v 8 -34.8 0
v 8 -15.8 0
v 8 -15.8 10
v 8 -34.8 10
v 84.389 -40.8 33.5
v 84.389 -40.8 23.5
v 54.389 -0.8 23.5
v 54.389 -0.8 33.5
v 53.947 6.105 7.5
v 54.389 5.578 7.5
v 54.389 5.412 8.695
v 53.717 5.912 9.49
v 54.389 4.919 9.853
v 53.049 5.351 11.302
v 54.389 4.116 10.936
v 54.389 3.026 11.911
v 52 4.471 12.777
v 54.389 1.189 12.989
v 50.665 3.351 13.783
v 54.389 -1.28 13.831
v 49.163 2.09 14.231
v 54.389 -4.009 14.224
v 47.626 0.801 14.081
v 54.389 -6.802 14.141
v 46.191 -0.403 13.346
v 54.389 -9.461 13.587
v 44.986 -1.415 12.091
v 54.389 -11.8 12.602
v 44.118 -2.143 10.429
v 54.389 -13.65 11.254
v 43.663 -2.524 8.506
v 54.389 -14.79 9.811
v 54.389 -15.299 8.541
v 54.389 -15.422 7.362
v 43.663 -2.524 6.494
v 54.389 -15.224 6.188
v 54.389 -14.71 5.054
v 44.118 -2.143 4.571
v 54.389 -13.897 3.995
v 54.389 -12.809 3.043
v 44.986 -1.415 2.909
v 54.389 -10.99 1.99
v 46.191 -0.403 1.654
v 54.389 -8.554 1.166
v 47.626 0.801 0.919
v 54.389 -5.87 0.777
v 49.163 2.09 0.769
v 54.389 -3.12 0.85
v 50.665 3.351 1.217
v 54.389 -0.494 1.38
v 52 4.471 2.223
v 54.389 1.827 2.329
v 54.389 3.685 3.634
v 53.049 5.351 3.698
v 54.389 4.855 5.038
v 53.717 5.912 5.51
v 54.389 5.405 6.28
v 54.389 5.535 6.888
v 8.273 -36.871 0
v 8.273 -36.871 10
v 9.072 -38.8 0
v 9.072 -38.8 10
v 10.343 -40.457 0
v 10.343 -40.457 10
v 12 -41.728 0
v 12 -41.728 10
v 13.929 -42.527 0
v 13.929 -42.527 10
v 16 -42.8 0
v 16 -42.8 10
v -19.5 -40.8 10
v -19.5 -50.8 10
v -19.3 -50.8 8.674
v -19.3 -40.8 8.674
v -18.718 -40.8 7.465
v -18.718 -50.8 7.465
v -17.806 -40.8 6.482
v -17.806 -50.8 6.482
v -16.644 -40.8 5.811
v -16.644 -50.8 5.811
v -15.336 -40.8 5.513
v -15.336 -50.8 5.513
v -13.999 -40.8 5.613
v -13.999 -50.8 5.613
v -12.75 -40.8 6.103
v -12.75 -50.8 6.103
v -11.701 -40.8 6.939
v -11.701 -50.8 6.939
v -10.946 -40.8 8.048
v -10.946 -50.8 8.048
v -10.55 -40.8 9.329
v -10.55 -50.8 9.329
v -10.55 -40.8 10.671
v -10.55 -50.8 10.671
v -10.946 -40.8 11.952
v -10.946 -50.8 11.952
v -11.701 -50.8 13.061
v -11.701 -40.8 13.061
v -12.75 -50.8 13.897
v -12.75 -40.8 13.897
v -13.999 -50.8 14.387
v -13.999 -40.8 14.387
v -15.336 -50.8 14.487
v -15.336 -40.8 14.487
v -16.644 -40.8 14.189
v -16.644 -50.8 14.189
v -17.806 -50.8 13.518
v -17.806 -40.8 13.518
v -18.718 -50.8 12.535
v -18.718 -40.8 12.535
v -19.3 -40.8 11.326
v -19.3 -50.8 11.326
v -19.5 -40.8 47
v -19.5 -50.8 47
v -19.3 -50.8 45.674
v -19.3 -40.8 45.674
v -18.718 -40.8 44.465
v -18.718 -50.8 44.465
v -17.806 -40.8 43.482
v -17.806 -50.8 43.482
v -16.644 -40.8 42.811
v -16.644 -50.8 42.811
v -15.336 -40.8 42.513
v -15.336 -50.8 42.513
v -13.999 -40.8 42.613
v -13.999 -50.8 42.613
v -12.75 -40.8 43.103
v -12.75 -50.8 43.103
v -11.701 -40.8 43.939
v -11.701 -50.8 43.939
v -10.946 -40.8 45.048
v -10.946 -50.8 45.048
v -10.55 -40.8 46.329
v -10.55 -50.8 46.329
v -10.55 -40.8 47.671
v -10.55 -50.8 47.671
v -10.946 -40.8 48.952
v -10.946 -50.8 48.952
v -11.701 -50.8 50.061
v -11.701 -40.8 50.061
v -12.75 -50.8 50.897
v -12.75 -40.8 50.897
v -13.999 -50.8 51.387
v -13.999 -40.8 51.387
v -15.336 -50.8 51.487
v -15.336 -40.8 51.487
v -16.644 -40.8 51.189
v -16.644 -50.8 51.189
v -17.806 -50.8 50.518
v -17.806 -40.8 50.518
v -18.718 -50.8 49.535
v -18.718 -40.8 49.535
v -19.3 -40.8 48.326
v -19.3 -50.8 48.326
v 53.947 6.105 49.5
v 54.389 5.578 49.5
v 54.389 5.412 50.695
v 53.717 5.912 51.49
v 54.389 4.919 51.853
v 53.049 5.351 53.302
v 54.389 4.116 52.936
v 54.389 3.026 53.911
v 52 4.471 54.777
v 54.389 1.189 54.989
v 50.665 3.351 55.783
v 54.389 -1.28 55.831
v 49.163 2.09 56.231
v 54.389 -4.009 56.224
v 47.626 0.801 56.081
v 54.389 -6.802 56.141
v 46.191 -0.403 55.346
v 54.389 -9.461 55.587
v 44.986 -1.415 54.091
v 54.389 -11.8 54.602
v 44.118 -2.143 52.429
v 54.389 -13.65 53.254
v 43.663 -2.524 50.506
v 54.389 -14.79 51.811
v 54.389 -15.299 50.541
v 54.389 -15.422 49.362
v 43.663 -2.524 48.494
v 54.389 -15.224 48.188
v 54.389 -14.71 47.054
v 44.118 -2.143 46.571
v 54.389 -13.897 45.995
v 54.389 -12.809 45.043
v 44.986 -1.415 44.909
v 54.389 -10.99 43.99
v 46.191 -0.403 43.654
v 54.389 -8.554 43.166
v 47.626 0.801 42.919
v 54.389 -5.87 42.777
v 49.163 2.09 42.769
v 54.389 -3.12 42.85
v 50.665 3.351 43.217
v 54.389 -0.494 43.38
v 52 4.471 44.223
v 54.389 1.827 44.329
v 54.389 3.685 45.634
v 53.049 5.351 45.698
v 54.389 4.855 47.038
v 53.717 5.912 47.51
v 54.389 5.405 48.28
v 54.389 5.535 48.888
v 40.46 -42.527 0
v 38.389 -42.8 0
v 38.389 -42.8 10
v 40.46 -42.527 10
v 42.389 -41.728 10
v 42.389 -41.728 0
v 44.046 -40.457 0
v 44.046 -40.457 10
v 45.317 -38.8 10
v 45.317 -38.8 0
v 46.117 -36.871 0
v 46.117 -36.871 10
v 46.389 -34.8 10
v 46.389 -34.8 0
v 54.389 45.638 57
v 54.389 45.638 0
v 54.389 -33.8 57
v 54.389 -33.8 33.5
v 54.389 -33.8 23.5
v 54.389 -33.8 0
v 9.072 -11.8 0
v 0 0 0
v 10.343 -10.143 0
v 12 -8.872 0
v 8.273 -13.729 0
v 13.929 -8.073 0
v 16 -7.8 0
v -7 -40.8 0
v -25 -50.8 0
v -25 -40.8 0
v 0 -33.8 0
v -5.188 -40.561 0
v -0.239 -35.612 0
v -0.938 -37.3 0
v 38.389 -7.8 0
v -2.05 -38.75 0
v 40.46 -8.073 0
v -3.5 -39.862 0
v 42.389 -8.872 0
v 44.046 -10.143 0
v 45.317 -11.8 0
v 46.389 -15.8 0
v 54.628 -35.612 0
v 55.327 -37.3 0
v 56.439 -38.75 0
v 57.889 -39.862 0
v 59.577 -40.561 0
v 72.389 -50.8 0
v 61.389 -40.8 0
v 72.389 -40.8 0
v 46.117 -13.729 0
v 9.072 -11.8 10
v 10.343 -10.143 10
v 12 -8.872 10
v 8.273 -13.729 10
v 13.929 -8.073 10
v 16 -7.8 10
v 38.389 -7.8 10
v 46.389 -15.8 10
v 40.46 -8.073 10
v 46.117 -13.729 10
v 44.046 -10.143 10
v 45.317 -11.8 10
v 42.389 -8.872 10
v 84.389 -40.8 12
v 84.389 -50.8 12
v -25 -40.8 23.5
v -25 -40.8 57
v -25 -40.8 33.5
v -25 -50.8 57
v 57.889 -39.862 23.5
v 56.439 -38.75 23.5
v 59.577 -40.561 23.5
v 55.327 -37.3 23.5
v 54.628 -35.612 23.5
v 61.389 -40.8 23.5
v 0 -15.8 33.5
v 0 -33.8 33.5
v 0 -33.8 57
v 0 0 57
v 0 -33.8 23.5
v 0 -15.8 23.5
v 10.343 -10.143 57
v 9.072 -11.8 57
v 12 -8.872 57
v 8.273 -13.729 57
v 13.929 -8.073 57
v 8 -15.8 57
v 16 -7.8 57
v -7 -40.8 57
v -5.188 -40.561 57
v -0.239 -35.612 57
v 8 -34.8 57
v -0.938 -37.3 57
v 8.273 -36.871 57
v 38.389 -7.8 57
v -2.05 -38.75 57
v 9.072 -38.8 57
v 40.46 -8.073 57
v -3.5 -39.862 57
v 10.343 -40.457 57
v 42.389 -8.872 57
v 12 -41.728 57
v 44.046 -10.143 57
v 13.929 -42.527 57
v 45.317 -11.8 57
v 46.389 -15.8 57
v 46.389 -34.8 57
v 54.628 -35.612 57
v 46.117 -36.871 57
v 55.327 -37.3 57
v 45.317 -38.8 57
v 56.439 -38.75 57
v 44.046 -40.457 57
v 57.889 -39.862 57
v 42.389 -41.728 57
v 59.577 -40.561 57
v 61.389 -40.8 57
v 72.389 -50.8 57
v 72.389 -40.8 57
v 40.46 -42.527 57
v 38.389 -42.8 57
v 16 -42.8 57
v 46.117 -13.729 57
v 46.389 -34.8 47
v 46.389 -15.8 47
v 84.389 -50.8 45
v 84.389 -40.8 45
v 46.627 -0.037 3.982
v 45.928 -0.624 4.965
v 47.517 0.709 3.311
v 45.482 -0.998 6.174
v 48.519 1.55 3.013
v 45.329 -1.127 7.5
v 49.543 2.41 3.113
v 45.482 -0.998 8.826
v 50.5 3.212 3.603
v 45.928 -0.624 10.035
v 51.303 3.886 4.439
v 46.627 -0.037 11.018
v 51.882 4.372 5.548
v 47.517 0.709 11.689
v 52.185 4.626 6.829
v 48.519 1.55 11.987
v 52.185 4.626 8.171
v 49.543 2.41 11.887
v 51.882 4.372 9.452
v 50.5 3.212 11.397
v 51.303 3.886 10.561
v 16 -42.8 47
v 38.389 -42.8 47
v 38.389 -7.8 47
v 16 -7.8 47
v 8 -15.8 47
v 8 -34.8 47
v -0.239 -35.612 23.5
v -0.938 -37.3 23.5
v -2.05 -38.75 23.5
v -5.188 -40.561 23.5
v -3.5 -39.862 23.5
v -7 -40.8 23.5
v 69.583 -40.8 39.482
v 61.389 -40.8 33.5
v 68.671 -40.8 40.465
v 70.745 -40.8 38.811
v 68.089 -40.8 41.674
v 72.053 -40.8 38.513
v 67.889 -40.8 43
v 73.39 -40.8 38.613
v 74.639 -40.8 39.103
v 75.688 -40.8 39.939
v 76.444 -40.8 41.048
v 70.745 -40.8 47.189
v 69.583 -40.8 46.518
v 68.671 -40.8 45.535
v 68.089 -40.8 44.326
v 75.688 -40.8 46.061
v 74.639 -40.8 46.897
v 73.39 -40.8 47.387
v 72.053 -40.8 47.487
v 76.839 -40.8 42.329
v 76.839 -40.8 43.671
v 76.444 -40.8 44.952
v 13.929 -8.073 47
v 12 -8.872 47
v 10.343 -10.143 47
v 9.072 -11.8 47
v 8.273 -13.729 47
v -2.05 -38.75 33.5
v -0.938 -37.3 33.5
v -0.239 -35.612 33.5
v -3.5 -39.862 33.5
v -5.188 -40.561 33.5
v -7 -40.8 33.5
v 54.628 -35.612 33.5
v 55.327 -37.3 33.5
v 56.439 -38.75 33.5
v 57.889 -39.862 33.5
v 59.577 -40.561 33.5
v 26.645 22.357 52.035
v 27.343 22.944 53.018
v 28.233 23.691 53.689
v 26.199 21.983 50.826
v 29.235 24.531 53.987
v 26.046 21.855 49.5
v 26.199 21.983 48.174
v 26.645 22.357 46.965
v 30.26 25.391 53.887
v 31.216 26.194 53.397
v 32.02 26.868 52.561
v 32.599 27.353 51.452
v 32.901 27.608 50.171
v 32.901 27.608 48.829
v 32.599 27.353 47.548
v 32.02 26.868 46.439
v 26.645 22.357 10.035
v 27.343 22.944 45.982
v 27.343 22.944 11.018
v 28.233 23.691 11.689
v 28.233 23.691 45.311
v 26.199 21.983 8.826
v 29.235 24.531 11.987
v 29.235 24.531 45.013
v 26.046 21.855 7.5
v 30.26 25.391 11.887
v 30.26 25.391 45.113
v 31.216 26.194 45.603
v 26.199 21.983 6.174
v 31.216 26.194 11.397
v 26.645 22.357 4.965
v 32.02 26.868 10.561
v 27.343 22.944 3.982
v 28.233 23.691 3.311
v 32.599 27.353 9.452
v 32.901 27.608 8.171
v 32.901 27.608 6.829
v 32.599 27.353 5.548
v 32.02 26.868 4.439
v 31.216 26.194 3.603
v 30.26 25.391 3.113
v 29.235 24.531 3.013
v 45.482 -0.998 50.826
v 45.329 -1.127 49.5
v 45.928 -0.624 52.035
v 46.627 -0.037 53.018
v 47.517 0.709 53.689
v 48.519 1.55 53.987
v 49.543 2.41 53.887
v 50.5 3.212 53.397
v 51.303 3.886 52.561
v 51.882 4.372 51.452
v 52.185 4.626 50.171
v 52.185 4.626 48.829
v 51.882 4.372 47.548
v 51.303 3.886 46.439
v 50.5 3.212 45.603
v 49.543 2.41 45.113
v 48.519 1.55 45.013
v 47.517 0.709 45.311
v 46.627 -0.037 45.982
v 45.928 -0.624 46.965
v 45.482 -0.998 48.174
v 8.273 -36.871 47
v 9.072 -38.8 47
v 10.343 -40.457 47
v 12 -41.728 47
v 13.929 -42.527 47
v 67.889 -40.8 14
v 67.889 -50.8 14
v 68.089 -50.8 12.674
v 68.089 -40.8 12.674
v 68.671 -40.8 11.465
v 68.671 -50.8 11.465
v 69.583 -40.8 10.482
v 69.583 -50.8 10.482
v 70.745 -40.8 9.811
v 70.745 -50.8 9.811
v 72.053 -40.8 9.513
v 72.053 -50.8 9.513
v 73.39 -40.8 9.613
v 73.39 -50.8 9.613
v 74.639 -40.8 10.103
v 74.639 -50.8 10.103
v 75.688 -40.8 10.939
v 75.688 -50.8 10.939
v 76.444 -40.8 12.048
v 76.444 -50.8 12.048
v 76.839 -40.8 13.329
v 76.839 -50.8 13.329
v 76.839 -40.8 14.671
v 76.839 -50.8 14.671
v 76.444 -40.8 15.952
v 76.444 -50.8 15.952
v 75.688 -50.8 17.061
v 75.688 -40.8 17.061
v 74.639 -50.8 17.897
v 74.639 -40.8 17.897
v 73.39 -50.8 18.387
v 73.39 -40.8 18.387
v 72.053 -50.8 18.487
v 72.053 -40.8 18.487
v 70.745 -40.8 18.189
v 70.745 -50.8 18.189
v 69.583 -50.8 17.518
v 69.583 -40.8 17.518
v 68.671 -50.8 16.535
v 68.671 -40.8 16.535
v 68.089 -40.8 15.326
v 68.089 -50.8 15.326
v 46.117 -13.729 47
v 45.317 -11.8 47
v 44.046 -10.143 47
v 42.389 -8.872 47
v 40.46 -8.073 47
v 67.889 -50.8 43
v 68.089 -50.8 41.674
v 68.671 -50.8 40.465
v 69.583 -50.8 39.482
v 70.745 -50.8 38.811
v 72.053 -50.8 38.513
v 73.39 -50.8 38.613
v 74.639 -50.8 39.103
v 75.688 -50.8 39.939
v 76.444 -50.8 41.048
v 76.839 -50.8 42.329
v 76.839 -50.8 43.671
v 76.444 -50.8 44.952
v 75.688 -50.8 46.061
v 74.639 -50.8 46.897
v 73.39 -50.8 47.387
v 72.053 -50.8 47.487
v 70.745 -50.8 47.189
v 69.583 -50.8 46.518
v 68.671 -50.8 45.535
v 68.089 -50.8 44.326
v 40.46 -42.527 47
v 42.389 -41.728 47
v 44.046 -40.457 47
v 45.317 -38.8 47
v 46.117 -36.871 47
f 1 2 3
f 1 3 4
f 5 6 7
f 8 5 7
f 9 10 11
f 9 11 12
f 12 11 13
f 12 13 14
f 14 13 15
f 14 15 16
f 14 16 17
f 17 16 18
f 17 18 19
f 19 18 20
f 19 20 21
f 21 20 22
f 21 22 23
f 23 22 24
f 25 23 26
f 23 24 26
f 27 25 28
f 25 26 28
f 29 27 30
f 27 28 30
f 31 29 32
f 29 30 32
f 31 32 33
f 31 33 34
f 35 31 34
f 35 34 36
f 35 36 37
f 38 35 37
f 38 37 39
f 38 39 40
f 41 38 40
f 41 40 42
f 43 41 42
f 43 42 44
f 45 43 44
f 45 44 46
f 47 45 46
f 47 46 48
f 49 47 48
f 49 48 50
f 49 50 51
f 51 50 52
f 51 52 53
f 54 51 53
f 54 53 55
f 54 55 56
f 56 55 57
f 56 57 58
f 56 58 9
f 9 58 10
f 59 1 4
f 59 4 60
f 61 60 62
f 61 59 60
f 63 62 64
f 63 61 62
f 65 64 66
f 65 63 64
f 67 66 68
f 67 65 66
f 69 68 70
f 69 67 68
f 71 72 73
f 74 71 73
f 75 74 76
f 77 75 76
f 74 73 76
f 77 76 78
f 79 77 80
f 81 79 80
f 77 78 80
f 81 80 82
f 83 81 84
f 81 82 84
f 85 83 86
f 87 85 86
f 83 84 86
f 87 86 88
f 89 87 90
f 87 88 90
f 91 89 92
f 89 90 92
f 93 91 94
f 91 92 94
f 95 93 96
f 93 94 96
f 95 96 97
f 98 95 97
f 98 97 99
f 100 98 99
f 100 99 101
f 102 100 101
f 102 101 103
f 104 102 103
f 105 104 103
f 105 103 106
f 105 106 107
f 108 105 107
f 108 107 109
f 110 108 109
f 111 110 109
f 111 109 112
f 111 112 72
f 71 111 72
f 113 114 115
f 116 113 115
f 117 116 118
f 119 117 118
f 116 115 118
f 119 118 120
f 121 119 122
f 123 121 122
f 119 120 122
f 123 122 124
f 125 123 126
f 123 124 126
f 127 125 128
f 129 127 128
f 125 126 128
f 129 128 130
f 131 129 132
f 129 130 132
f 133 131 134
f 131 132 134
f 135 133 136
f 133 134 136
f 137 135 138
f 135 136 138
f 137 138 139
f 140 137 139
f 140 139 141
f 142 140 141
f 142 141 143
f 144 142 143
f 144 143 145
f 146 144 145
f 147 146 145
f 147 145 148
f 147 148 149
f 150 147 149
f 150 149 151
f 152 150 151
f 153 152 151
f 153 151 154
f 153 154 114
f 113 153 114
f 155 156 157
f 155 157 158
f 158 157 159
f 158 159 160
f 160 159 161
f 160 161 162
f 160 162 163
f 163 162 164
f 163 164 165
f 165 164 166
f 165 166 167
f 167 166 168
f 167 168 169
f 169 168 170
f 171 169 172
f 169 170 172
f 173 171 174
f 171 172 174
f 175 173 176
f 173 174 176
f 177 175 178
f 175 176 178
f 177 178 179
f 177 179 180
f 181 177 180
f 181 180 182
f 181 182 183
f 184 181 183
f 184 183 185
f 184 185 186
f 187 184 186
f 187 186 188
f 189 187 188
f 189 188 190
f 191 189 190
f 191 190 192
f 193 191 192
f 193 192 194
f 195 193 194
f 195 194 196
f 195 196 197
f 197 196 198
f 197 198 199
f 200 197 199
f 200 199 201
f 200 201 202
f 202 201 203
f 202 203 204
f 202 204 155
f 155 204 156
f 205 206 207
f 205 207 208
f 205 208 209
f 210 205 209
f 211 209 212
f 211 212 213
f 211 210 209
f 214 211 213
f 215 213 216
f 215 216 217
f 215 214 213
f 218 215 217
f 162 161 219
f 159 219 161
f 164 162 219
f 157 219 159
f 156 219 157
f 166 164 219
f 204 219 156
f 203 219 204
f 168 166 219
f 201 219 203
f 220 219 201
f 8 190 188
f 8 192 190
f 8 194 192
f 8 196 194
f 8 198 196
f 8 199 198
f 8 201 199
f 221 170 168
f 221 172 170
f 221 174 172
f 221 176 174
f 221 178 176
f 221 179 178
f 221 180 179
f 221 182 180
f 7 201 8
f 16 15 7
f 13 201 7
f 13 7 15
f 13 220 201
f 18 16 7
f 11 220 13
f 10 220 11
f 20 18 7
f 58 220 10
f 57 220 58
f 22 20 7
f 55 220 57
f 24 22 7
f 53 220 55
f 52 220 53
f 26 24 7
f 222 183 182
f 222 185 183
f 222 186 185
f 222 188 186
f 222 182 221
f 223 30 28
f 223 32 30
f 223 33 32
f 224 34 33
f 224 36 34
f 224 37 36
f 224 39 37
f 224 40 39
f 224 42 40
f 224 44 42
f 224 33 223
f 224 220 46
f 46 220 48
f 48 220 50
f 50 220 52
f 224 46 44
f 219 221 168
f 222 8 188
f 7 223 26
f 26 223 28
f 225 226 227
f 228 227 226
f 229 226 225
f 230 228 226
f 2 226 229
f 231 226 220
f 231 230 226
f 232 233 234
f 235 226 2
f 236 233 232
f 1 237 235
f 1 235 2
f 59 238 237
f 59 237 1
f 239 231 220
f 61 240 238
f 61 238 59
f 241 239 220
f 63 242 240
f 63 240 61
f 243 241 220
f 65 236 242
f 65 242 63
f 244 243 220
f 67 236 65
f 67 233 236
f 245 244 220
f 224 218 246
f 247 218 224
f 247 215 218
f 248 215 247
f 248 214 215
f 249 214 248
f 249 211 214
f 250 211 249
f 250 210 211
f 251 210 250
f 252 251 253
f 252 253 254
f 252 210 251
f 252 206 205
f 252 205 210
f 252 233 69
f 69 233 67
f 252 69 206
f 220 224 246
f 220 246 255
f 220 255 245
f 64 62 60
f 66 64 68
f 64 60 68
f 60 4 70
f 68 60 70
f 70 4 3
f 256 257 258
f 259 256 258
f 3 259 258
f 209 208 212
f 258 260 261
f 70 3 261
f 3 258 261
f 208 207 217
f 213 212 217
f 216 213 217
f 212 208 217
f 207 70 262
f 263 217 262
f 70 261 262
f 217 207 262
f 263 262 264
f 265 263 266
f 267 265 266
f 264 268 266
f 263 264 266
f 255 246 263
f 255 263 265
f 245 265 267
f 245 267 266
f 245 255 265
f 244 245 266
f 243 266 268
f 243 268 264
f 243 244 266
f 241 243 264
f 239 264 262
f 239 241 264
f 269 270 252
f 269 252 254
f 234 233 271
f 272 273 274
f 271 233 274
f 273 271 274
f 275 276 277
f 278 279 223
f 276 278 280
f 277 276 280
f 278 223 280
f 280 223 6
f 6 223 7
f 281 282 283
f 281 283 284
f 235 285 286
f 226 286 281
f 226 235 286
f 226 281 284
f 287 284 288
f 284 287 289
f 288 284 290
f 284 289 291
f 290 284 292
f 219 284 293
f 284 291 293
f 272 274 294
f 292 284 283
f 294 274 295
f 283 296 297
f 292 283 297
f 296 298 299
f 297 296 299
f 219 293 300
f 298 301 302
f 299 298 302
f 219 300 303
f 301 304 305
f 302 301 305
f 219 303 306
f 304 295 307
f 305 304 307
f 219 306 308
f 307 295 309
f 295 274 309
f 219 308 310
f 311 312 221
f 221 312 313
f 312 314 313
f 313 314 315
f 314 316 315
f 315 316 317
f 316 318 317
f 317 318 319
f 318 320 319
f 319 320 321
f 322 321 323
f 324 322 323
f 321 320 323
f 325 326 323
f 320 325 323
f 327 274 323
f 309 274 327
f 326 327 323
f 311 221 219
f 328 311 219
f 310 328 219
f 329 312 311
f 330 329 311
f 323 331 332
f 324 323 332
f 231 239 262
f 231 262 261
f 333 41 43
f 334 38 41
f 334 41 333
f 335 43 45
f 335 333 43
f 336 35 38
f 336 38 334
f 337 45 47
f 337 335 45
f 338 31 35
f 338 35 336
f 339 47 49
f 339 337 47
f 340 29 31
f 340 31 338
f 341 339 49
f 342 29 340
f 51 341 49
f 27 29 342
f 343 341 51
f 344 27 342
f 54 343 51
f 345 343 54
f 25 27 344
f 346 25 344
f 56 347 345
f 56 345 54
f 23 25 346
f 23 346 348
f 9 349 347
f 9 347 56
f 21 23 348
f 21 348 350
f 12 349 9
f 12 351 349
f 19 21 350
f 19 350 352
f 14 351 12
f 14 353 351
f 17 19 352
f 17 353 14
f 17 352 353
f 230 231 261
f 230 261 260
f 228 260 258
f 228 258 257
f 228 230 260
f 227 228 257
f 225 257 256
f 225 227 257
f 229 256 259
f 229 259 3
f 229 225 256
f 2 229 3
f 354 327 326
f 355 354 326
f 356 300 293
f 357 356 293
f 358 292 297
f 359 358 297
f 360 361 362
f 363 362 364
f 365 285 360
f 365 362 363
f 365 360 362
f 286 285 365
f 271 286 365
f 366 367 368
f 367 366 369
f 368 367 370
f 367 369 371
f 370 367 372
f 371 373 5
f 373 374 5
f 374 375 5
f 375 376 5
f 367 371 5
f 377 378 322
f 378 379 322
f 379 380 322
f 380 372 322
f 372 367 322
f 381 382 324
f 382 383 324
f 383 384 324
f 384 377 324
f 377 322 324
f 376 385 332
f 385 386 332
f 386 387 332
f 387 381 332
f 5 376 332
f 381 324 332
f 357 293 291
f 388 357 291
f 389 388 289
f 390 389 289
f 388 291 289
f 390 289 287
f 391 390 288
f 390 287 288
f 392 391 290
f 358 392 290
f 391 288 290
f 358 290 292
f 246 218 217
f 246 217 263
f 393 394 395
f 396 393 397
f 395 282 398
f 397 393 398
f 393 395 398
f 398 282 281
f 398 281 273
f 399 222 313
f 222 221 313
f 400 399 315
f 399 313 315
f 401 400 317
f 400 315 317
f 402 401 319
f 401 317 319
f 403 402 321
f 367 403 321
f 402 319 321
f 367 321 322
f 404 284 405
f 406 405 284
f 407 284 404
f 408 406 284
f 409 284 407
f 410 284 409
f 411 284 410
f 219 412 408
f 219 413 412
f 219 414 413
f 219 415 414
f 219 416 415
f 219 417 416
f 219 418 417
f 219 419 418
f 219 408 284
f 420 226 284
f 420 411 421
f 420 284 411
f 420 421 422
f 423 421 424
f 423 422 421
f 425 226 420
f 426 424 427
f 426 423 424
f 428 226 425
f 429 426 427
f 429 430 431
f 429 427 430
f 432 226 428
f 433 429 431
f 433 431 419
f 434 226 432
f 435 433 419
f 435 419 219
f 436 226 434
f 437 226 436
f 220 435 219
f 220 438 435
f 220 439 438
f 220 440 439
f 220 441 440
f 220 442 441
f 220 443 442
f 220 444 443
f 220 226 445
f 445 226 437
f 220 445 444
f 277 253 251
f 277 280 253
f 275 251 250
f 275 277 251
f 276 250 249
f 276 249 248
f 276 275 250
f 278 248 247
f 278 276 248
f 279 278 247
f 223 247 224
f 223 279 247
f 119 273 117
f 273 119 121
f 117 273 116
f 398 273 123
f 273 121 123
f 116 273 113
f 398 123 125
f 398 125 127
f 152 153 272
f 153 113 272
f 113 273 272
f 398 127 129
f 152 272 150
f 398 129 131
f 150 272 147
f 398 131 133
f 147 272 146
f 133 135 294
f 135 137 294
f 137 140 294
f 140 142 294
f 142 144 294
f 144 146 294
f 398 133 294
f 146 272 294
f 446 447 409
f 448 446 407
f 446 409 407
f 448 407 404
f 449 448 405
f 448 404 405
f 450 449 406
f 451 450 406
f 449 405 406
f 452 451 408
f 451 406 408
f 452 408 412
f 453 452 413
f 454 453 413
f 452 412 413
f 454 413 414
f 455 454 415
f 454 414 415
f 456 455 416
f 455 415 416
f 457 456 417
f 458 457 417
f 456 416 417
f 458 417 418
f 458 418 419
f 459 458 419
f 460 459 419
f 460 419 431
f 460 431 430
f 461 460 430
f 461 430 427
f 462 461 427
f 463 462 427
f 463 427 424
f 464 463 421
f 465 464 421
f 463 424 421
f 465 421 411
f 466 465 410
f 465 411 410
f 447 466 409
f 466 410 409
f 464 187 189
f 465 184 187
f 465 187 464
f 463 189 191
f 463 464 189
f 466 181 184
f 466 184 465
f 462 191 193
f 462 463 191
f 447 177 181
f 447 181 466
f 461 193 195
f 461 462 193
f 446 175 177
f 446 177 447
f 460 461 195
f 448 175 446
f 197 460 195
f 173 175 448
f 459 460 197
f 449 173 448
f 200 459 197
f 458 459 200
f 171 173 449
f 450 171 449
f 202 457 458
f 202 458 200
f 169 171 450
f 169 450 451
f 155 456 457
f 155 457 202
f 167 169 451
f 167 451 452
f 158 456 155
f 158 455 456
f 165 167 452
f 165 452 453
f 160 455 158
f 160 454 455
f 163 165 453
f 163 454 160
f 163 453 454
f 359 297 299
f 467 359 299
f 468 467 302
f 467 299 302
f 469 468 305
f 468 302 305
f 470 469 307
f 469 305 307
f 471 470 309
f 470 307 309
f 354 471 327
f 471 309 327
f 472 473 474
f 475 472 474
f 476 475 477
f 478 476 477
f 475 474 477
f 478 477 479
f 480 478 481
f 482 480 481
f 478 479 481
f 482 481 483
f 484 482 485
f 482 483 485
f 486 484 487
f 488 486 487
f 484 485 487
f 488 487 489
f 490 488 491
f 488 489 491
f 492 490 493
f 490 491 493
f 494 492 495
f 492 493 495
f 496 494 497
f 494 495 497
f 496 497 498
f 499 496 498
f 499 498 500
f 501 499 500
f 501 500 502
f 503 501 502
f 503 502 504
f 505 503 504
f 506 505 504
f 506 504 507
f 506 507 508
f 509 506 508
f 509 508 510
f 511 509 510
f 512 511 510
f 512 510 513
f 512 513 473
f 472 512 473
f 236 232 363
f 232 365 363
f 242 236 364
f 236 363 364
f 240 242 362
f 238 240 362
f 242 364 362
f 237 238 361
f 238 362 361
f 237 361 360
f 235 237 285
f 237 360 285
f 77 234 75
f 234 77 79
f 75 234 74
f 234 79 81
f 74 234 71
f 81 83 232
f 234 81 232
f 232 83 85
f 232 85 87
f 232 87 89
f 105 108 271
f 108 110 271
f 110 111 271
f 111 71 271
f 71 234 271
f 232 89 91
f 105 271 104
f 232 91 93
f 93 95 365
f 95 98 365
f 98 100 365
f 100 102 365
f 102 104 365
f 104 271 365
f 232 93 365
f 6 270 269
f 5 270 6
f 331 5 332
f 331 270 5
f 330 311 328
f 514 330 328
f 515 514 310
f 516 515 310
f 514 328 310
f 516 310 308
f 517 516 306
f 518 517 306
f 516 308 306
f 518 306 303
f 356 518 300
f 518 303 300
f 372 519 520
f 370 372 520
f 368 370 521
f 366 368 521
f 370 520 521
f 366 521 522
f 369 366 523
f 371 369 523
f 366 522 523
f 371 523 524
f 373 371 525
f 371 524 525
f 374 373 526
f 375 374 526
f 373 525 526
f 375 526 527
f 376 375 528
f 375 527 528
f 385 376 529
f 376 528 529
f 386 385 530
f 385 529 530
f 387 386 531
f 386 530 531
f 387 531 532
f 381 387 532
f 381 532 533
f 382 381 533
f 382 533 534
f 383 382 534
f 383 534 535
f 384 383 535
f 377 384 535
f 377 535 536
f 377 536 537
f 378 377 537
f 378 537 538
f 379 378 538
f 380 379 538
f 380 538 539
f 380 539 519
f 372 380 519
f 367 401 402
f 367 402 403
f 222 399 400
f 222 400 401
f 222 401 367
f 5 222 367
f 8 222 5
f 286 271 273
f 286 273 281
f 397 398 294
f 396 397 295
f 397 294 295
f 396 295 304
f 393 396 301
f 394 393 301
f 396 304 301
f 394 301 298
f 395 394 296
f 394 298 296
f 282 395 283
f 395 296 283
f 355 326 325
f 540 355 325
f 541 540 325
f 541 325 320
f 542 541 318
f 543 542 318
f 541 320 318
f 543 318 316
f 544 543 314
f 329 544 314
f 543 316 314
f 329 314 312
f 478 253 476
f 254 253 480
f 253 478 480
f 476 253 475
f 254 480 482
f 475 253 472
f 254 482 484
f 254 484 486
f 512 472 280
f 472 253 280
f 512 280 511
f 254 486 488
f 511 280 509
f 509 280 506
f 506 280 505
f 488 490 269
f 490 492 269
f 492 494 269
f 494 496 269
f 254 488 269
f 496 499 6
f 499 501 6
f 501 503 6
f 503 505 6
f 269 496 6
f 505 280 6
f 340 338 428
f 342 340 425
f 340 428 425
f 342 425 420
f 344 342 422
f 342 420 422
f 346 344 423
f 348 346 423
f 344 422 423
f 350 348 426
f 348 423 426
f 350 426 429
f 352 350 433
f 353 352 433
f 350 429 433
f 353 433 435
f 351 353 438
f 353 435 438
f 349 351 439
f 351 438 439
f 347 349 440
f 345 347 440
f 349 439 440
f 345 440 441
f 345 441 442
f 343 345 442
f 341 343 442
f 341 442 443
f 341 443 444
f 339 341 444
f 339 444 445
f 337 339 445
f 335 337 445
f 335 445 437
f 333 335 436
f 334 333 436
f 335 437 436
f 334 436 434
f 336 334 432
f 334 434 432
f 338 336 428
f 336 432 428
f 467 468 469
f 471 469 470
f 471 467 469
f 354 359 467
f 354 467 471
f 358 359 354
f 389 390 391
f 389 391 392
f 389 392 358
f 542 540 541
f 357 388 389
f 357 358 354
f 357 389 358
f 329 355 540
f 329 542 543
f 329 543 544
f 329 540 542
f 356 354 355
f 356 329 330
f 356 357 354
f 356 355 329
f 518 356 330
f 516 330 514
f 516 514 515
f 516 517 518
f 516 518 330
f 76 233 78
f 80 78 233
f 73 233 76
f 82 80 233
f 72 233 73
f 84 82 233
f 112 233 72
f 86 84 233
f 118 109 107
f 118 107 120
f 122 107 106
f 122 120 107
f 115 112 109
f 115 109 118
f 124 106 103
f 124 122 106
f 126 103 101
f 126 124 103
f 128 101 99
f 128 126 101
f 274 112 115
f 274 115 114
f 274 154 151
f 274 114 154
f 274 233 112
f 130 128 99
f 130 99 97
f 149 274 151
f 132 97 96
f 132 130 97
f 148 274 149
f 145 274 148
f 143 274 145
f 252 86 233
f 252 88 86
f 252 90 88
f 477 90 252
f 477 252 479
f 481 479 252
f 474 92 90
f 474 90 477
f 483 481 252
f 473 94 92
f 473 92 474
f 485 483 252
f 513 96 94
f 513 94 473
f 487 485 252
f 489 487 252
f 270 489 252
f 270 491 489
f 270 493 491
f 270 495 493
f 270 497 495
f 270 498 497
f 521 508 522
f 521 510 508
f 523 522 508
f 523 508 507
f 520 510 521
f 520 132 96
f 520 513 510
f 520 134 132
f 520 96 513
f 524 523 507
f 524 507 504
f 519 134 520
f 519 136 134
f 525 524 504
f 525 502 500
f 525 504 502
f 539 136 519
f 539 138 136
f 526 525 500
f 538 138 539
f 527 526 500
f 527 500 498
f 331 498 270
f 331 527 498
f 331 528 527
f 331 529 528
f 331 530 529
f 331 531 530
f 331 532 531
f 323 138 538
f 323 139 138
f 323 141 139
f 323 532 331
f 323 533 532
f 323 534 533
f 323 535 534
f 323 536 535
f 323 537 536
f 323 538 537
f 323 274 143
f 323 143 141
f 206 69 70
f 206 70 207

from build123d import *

# Parameters (mm, degrees)
BOSS_EXTRUDE1_DEPTH            = 57
SKETCH3_R                      = 4
CUT_EXTRUDE1_DEPTH             = 94.743374336
CBORE_FOR_M8_SHCS2_D           = 9
CBORE_FOR_M8_SHCS2_CBORE_D     = 13.5
CBORE_FOR_M8_SHCS2_CBORE_DEPTH = 20
SKETCH7_W                      = 30
SKETCH7_H                      = 57
BOSS_EXTRUDE2_DEPTH            = 10
BOSS_EXTRUDE3_DEPTH            = 5
BOSS_EXTRUDE3_DEPTH_BACK       = 5
SKETCH9_W                      = 25
SKETCH9_H                      = 57
BOSS_EXTRUDE4_DEPTH            = 10
BOSS_EXTRUDE5_DEPTH            = 5
BOSS_EXTRUDE5_DEPTH_BACK       = 5
CUT_EXTRUDE2_DEPTH             = 10
FILLET1_R                      = 7
CHAMFER1_SIZE                  = 12
M8_CLEARANCE_HOLE1_D           = 9


with BuildPart() as part:
    # Sketch2 → Boss-Extrude1 (new body)
    with BuildSketch(Plane.XY):
        Polygon((0, 0), (54.389155461, 45.637920288), (54.389155461, -50.8), (0, -50.8), align=None)
    extrude(amount=BOSS_EXTRUDE1_DEPTH)

    # Sketch3 → Cut-Extrude1 (cut, through all)
    with BuildSketch(Plane(origin=(0, 0, 0), x_dir=(0.7660444431189817, 0.6427876096865353, 0), z_dir=(-0.6427876096865353, 0.7660444431189817, 0))):
        with Locations(Location((38.5, -7.5, 0), (0, 0, 180))):
            Circle(SKETCH3_R)
        with Locations(Location((38.5, -49.5, 0), (0, 0, 180))):
            Circle(SKETCH3_R)
    extrude(amount=-CUT_EXTRUDE1_DEPTH, mode=Mode.SUBTRACT)

    # CBORE for M8 SHCS2 (through all)
    with Locations(Plane(origin=(32.139380484, -38.302222156, 0), x_dir=(0.7660444431189817, 0.6427876096865353, 0), z_dir=(0.6427876096865353, -0.7660444431189817, 0))):
        with Locations((38.5, 49.5), (38.5, 7.5)):
            CounterBoreHole(CBORE_FOR_M8_SHCS2_D / 2, CBORE_FOR_M8_SHCS2_CBORE_D / 2, CBORE_FOR_M8_SHCS2_CBORE_DEPTH)

    # Sketch7 → Boss-Extrude2 (add)
    with BuildSketch(Plane.XZ.offset(50.8)):
        with Locations((69.389155461, 28.5)):
            Rectangle(SKETCH7_W, SKETCH7_H)
    extrude(amount=-BOSS_EXTRUDE2_DEPTH)

    # Sketch8 → Boss-Extrude3 (add, two sides: drawn at the far end of the back side and taken through both)
    with BuildSketch(Plane.XY.offset(28.5).offset(-BOSS_EXTRUDE3_DEPTH_BACK)):
        Polygon((84.389155461, -40.8), (54.389155461, -0.8), (54.389155461, -40.8), align=None)
    extrude(amount=BOSS_EXTRUDE3_DEPTH + BOSS_EXTRUDE3_DEPTH_BACK)

    # Sketch9 → Boss-Extrude4 (add)
    with BuildSketch(Plane.XZ.offset(50.8)):
        with Locations((-12.5, 28.5)):
            Rectangle(SKETCH9_W, SKETCH9_H)
    extrude(amount=-BOSS_EXTRUDE4_DEPTH)

    # Sketch10 → Boss-Extrude5 (add, two sides: drawn at the far end of the back side and taken through both)
    with BuildSketch(Plane.XY.offset(28.5).offset(-BOSS_EXTRUDE5_DEPTH_BACK)):
        Polygon((-25, -40.8), (0, -15.8), (0, -40.8), align=None)
    extrude(amount=BOSS_EXTRUDE5_DEPTH + BOSS_EXTRUDE5_DEPTH_BACK)

    # Sketch11 → Cut-Extrude2 (cut)
    with BuildSketch(Plane(origin=(0, 0, 0), x_dir=(-1, 0, 0), z_dir=(0, 0, -1))):
        with BuildLine():
            Line((-38.389155461, -7.8), (-16, -7.8))
            ThreePointArc((-16, -7.8), (-10.343145751, -10.143145751), (-8, -15.8))
            Line((-8, -15.8), (-8, -34.8))
            ThreePointArc((-8, -34.8), (-10.343145751, -40.456854249), (-16, -42.8))
            Line((-16, -42.8), (-38.389155461, -42.8))
            ThreePointArc((-38.389155461, -42.8), (-44.046009711, -40.456854249), (-46.389155461, -34.8))
            Line((-46.389155461, -34.8), (-46.389155461, -15.8))
            ThreePointArc((-46.389155461, -15.8), (-44.046009711, -10.143145751), (-38.389155461, -7.8))
        make_face()
    cut_extrude2 = extrude(amount=-CUT_EXTRUDE2_DEPTH, mode=Mode.SUBTRACT)

    # Mirror1: Cut-Extrude2 across plane
    add(cut_extrude2.mirror(Plane.XY.offset(28.5)), mode=Mode.SUBTRACT)

    # Fillet1
    fillet1_edges = [part.edges().sort_by_distance(p)[0] for p in [
        (54.389155461, -40.8, 45.25),
        (54.389155461, -40.8, 11.75),
        (0, -40.8, 11.75),
        (0, -40.8, 45.25),
    ]]
    fillet(fillet1_edges, radius=FILLET1_R)

    # Chamfer1
    chamfer1_edges = [part.edges().sort_by_distance(p)[0] for p in [
        (84.389155461, -45.8, 57),
        (84.389155461, -45.8, 0),
    ]]
    chamfer(chamfer1_edges, length=CHAMFER1_SIZE)

    # M8 Clearance Hole1 (through all)
    with Locations(Plane(origin=(0, -40.8, 0), x_dir=(1, 0, 0), z_dir=(0, 1, 0))):
        with Locations((72.389155461, -43), (72.389155461, -14), (-15, -10), (-15, -47)):
            Hole(M8_CLEARANCE_HOLE1_D / 2)


solid = part.part
